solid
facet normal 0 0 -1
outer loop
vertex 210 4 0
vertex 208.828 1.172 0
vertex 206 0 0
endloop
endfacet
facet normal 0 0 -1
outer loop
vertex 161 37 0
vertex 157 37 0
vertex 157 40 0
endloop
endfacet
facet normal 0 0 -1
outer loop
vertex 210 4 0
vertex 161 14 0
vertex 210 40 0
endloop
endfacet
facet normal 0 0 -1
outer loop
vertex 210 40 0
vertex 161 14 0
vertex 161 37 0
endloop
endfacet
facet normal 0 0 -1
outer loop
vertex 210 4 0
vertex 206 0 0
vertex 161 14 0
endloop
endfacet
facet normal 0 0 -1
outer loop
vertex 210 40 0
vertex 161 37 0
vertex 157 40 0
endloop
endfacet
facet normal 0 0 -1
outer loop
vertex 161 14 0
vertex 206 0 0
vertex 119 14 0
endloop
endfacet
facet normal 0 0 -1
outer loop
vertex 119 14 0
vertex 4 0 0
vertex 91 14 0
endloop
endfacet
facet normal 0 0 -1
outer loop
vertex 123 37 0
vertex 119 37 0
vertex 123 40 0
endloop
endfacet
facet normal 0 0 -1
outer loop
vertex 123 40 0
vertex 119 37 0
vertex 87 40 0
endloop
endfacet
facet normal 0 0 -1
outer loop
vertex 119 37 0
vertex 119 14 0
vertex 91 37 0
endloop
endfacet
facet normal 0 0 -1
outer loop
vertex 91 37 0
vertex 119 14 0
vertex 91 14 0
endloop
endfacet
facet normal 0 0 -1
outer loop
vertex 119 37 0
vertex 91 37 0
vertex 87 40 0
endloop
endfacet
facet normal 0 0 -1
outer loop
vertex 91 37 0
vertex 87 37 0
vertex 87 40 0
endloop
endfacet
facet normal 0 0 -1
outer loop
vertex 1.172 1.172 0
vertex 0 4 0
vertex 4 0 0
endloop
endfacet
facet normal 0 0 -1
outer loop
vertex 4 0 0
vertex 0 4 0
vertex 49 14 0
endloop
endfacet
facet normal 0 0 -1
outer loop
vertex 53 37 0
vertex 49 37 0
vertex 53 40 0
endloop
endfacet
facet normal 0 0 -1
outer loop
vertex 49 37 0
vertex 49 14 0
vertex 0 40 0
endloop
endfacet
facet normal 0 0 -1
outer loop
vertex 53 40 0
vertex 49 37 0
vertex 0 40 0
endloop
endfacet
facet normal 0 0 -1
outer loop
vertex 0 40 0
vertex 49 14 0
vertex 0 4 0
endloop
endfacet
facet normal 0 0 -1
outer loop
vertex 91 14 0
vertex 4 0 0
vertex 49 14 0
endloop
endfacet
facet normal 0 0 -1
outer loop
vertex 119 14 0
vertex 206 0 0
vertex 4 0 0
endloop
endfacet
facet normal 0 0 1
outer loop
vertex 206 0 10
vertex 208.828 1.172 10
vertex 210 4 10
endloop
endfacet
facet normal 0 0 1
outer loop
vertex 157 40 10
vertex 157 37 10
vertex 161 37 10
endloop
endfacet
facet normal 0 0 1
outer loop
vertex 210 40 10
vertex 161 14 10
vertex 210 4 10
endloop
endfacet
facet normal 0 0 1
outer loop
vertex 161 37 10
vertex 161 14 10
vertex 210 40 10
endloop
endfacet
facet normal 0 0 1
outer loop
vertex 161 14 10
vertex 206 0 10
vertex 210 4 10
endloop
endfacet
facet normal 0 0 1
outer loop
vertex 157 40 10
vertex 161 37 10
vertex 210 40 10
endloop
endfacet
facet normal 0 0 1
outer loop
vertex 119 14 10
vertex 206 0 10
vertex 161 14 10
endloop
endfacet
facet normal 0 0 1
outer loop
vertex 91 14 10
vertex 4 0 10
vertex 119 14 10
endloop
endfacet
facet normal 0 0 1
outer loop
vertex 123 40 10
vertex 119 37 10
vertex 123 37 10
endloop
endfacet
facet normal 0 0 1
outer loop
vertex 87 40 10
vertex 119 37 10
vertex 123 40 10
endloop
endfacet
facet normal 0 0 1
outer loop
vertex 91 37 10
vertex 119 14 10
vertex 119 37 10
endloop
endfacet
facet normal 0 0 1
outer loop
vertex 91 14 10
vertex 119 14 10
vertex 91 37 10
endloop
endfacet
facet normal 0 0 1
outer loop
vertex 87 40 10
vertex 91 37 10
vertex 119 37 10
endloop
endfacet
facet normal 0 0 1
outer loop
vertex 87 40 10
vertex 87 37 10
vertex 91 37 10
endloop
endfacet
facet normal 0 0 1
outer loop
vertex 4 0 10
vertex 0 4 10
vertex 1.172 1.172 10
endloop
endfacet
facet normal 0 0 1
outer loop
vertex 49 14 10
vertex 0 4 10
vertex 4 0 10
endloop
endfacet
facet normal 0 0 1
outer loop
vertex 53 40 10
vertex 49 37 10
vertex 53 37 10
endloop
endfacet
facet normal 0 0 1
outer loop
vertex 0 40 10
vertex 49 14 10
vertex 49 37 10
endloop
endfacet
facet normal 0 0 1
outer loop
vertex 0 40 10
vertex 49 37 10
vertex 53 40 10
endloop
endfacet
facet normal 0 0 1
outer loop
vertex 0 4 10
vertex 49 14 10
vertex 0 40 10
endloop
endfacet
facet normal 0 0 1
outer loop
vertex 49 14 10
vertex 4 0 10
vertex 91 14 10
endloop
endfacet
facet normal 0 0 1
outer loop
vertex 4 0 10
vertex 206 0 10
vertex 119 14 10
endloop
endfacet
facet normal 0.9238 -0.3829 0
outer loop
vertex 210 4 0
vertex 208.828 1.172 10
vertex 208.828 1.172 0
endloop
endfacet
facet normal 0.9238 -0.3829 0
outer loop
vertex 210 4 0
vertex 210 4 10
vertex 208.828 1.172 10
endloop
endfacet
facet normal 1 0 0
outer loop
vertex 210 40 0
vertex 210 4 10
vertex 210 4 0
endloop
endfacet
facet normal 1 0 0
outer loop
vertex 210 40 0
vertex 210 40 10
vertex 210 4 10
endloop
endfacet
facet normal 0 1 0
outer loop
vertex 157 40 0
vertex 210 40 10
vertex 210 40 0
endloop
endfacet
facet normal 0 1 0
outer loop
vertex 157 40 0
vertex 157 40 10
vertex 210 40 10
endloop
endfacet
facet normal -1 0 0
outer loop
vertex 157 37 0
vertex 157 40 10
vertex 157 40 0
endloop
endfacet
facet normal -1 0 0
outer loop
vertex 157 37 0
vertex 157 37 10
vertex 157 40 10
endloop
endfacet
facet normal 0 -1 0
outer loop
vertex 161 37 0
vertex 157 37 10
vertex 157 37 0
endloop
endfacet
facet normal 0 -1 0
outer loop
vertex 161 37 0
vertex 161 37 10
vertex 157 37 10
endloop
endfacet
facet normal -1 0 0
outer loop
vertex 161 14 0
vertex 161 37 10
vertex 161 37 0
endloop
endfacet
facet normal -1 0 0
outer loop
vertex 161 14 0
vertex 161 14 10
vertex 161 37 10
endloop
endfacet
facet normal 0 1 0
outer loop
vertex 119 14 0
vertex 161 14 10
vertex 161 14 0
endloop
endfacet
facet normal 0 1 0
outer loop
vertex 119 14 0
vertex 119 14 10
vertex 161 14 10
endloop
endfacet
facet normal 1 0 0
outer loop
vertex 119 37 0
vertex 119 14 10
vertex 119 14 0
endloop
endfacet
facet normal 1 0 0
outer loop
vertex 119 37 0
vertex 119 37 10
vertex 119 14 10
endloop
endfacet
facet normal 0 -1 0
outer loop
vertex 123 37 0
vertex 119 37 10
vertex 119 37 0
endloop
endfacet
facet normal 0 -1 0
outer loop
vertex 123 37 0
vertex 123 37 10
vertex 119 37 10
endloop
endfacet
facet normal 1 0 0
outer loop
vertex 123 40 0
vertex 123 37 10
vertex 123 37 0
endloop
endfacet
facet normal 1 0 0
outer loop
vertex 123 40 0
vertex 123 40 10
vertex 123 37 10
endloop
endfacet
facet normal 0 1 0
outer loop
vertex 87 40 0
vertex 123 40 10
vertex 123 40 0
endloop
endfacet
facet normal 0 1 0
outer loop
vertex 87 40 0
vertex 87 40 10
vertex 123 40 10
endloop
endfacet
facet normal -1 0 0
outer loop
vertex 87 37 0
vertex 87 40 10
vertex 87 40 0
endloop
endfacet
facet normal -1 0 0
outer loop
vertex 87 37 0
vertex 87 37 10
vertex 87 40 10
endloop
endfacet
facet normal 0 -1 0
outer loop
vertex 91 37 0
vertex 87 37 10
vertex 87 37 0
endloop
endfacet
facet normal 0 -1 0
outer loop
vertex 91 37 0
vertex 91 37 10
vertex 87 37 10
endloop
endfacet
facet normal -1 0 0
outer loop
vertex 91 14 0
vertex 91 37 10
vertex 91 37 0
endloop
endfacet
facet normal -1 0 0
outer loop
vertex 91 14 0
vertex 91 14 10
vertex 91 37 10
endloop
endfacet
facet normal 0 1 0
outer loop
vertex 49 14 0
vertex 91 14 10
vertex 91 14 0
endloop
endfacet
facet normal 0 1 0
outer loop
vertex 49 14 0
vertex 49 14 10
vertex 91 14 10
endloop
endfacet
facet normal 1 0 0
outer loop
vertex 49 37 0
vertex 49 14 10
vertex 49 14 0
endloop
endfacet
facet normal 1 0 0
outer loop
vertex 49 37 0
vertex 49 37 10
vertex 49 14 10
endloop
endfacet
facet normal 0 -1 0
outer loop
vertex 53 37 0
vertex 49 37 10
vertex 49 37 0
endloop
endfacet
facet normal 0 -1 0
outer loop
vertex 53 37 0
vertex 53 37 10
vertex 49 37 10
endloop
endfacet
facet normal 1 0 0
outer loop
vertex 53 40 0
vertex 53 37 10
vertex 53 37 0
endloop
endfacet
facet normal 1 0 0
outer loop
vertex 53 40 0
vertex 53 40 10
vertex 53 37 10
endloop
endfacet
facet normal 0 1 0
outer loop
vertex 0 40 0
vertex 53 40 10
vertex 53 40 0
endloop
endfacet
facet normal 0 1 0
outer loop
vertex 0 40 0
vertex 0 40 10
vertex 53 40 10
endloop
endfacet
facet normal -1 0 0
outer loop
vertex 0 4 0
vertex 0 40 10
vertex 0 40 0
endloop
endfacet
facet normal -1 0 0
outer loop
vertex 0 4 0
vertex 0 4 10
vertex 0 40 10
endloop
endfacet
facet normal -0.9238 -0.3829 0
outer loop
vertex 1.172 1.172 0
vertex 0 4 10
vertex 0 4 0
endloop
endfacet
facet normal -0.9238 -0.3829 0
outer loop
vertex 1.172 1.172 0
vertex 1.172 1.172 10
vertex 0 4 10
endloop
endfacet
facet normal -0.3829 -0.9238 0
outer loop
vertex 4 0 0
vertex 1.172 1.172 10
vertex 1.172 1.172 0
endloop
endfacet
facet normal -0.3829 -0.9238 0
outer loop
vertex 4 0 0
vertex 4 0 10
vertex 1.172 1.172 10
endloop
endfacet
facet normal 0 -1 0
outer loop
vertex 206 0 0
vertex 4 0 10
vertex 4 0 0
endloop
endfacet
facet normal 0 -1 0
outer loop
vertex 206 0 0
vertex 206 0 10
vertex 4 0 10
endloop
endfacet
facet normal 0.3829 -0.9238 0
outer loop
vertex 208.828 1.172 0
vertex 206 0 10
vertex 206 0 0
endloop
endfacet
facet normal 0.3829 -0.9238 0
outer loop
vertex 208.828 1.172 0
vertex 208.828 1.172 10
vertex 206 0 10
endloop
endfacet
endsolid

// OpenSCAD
$fn = 32;

// ----------------------------------------------------------------------
// Oversize slot bar: 210 mm bar with 2 oversize windows
// ----------------------------------------------------------------------

// --- parameters (mm) ---
profile_height = 10;      // extrusion height
profile_points = 24;      // points of the closed outline

profile = [[0, 4], [1.172, 1.172], [4, 0], [206, 0], [208.828, 1.172], [210, 4], [210, 40], [157, 40], [157, 37], [161, 37], [161, 14], [119, 14], [119, 37], [123, 37], [123, 40], [87, 40], [87, 37], [91, 37], [91, 14], [49, 14], [49, 37], [53, 37], [53, 40], [0, 40]];  // single closed polygon, 24 points, counter clockwise

// --- the one profile operation ---
linear_extrude(height = profile_height) polygon(points = profile);
